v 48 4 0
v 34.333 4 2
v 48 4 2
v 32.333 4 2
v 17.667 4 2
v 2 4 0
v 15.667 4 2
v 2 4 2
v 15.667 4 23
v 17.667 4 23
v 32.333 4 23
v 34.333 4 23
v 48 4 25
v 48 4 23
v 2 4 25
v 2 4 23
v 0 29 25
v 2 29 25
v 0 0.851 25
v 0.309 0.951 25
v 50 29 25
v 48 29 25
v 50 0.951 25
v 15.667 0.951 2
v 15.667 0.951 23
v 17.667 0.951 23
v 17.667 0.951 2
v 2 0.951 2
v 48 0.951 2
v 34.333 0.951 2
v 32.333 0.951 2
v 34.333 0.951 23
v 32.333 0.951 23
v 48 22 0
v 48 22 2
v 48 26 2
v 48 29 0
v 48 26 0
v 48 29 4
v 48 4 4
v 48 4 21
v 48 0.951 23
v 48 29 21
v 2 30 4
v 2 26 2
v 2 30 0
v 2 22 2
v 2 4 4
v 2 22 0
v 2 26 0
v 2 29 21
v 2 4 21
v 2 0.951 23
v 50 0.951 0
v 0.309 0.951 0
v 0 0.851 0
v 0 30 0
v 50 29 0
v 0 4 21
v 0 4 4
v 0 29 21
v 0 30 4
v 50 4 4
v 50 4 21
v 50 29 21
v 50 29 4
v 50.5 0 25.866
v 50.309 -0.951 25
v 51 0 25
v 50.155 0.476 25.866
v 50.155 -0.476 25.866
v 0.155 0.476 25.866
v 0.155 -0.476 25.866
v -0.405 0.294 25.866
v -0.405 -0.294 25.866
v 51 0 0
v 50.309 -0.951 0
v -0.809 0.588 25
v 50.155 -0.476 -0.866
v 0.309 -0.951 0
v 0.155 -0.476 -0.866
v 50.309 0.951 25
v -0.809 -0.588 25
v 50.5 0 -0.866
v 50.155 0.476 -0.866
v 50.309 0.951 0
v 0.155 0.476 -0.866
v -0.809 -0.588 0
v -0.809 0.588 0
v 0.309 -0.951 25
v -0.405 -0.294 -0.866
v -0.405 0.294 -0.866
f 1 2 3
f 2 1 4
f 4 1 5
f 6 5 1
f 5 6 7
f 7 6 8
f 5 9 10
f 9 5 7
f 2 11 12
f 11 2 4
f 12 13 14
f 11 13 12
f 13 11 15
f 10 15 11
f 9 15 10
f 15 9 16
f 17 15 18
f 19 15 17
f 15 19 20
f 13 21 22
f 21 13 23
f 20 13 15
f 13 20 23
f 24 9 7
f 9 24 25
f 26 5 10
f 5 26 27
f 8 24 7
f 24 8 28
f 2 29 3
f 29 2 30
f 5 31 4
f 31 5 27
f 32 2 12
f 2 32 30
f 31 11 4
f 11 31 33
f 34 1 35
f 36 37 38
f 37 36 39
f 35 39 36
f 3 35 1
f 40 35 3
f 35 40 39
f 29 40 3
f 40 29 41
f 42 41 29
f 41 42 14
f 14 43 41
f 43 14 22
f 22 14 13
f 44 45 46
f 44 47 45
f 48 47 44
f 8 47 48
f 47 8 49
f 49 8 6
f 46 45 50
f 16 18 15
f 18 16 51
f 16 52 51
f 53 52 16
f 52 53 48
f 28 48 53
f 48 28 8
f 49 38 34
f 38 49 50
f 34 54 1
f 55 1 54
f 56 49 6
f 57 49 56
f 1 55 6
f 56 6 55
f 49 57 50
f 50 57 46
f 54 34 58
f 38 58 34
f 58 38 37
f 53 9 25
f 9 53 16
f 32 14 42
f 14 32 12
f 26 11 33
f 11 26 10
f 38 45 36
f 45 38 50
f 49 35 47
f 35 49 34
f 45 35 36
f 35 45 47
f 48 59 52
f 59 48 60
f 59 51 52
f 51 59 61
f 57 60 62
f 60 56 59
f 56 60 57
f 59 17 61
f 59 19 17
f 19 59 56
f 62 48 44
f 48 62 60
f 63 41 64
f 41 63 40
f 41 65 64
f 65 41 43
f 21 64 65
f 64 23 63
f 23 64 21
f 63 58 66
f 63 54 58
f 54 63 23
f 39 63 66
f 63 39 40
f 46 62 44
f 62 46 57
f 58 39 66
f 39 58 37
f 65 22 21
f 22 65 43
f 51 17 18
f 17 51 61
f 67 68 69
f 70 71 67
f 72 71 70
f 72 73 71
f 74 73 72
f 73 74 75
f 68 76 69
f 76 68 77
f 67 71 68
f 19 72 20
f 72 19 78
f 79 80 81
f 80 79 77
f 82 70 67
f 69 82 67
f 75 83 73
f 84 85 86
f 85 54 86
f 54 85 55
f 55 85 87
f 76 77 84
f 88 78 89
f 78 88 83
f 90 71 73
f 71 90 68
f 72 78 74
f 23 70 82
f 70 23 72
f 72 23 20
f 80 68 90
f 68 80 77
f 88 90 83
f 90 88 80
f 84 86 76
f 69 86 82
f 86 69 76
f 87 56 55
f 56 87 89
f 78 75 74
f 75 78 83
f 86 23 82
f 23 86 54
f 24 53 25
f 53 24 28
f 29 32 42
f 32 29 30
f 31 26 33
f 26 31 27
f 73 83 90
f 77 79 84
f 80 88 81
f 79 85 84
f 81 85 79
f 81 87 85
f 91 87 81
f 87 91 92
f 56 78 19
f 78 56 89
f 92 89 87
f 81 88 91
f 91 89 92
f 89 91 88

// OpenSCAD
/* Options */
width = 50; // [1:100]
height = 30; // [1:100]
depth = 25; // [1:100]

/* Hidden */ 

desk(width,height,depth);

module desk(width,height,depth) {
    module top(width,height,depth) {
        hull() {
            sphere(1);
            translate([width,0,0]) sphere(1);
            translate([width,0,depth]) sphere(1);
            translate([0,0,depth]) sphere(1);
        }
    }

    module legs(width,height,depth) {
        cube([2,height,4]);
        translate([width-2,0,0]) cube([2,height-1,4]);
        translate([width-2,0,depth-4]) cube([2,height-1,4]);
        translate([0,0,depth-4]) cube([2,height-1,4]);
    }
    
    module bracing(width,height,depth,bracedSections) {
            translate([2,0,2]) rotate([-90,0,0]) cube([width-4,2,4]);
            translate([2,0,depth]) rotate([-90,0,0]) cube([width-4,2,4]);
            translate([2,height-8,2]) rotate([-90,0,0]) cube([width-4,2,4]);
            translate([2,0,depth-4]) rotate([-90,90,0]) cube([depth-8,2,4]);
            translate([width,0,depth-4]) rotate([-90,90,0]) cube([depth-8,2,4]);
            for (i = [1:1:bracedSections-1]) {
                translate([((width*i)/bracedSections+1),0,depth]) rotate([-90,90,0]) cube([depth-2,2,4]);
            }
     }

     union() {
        color("BurlyWood") top(width,height,depth);
        color("Khaki") bracing(width,height,depth,3);
        color("Tan") legs(width,height,depth);
     }
}
